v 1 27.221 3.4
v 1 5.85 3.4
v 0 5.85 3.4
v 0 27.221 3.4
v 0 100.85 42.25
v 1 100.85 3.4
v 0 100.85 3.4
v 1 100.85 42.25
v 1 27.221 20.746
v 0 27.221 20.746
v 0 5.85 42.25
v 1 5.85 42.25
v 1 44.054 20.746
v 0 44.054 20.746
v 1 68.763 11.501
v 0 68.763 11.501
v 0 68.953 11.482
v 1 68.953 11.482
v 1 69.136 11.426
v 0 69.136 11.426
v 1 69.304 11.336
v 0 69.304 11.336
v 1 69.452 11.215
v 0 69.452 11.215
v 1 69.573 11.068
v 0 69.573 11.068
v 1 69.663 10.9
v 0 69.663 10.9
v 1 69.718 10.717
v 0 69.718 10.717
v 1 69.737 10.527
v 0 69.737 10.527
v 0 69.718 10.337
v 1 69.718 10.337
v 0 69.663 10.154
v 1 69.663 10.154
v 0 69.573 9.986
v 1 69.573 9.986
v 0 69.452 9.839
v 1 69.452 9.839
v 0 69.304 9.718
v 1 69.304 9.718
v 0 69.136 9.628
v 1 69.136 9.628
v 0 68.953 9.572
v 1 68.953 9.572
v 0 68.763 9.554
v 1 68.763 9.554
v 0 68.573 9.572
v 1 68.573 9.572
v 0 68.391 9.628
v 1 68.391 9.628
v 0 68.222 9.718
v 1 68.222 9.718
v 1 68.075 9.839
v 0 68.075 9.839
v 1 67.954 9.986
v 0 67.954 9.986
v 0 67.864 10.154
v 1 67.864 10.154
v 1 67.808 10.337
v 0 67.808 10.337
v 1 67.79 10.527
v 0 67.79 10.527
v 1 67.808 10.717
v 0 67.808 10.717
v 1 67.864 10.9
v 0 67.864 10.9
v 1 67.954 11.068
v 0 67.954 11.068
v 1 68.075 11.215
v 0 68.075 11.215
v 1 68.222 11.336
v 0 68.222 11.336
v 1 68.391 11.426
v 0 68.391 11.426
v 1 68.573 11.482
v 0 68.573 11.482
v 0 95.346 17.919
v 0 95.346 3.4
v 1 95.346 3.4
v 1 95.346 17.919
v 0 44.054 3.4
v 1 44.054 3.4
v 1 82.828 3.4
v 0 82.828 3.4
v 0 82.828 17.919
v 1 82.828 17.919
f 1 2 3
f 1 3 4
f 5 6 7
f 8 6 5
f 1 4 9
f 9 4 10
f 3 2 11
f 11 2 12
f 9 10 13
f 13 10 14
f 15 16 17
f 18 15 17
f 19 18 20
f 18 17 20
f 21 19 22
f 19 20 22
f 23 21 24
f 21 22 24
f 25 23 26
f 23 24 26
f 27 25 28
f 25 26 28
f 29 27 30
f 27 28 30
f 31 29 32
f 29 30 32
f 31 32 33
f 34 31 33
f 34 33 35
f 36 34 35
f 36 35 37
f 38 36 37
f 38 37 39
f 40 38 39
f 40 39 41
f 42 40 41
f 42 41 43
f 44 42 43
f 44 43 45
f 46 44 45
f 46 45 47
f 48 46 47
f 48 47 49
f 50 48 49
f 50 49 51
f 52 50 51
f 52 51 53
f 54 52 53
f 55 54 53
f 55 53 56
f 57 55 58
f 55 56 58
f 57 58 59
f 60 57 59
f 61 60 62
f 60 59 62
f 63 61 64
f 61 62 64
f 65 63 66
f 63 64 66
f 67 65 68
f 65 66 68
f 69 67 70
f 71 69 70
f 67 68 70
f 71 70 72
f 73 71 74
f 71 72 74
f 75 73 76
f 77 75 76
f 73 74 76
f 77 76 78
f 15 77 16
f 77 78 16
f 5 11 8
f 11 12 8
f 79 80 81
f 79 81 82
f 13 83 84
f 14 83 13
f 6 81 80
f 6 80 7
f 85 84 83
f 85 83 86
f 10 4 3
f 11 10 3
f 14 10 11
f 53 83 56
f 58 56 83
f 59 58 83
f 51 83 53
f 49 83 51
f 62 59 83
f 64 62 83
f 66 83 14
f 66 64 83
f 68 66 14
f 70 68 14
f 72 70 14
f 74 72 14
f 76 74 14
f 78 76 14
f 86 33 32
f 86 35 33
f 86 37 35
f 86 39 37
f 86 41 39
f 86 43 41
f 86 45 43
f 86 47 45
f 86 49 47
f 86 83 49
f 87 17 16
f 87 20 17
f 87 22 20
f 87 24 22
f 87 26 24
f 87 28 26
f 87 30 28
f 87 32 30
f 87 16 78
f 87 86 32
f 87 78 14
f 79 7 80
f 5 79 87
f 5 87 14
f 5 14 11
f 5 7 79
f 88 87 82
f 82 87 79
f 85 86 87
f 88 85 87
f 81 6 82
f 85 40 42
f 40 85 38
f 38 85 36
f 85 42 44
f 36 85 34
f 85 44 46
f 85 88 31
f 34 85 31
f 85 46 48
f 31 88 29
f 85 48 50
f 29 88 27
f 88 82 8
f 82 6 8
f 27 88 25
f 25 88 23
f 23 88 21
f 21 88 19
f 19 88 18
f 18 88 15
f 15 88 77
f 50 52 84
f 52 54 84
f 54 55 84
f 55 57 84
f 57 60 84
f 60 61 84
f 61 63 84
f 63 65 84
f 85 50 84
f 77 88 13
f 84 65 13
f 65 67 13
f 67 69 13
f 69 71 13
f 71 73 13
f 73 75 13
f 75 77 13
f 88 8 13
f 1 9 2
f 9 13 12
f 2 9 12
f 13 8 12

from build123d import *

# Parameters (mm, degrees)
SKETCH_1_W          = 95
SKETCH_1_H          = 38.85
EXTRUDE_1_DEPTH     = 0.5
SKETCH_2_W          = 38.85
SKETCH_2_H          = 95
EXTRUDE_2_DEPTH     = 0.5
SKETCH_3_W          = 20.065150591
SKETCH_3_H          = 12.517385588
CUT_EXTRUDE_1_DEPTH = 3
SKETCH_4_W          = 23.07389694
SKETCH_4_H          = 16.832919213
CUT_EXTRUDE_2_DEPTH = 3
SKETCH_5_R          = 0.973496531
CUT_EXTRUDE_3_DEPTH = 3


with BuildPart() as part:
    # Эскиз1 → Бобышка-Вытянуть1 (new body)
    with BuildSketch(Plane(origin=(0.5, 0, 0), x_dir=(0, -1, 0), z_dir=(-1, 0, 0))):
        with Locations((-53.35, 22.825)):
            Rectangle(SKETCH_1_W, SKETCH_1_H)
    extrude(amount=-EXTRUDE_1_DEPTH)

    # Эскиз2 → Бобышка-Вытянуть2 (add)
    with BuildSketch(Plane.ZY.offset(-0.5)):
        with Locations((22.825, 53.35)):
            Rectangle(SKETCH_2_W, SKETCH_2_H)
    extrude(amount=EXTRUDE_2_DEPTH)

    # Эскиз3 → Вырез-Вытянуть1 (cut)
    with BuildSketch(Plane.ZY):
        with Locations((7.88603419, 89.086980773)):
            Rectangle(SKETCH_3_W, SKETCH_3_H)
    extrude(amount=-CUT_EXTRUDE_1_DEPTH, mode=Mode.SUBTRACT)

    # Эскиз4 → Вырез-Вытянуть2 (cut)
    with BuildSketch(Plane.ZY):
        with Locations((9.208796156, 35.637729194)):
            Rectangle(SKETCH_4_W, SKETCH_4_H)
    extrude(amount=-CUT_EXTRUDE_2_DEPTH, mode=Mode.SUBTRACT)

    # Эскиз5 → Вырез-Вытянуть3 (cut)
    with BuildSketch(Plane.ZY):
        with Locations((10.527030872, 68.763270983)):
            Circle(SKETCH_5_R)
    extrude(amount=-CUT_EXTRUDE_3_DEPTH, mode=Mode.SUBTRACT)


solid = part.part
